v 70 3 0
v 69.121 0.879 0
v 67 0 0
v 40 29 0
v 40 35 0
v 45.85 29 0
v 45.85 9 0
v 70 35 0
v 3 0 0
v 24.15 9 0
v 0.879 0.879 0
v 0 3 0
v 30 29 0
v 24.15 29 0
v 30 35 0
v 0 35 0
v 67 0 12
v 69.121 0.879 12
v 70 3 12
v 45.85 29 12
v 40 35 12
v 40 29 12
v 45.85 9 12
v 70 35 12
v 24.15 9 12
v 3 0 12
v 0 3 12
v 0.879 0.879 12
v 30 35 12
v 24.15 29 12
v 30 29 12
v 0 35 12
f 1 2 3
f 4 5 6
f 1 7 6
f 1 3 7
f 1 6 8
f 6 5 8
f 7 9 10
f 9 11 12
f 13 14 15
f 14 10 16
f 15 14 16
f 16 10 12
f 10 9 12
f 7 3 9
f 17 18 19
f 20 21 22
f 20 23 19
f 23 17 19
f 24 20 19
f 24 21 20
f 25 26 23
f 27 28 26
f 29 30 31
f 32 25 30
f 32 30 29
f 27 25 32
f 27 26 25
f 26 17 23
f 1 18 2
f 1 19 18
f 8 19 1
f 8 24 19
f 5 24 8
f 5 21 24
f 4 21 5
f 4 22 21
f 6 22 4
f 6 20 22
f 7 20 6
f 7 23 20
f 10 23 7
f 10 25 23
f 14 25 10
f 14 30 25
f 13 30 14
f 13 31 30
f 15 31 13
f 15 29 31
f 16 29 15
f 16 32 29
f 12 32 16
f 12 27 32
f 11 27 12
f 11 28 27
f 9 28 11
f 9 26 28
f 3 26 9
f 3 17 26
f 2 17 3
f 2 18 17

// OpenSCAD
$fn = 32;

// ----------------------------------------------------------------------
// Window plate: 70 x 35 mm, 1 open windows
// ----------------------------------------------------------------------

// --- parameters (mm) ---
profile_height = 12;      // extrusion height
profile_points = 16;      // points of the closed outline

profile = [[0, 3], [0.879, 0.879], [3, 0], [67, 0], [69.121, 0.879], [70, 3], [70, 35], [40, 35], [40, 29], [45.85, 29], [45.85, 9], [24.15, 9], [24.15, 29], [30, 29], [30, 35], [0, 35]];  // single closed polygon, 16 points, counter clockwise

// --- the one profile operation ---
linear_extrude(height = profile_height) polygon(points = profile);
